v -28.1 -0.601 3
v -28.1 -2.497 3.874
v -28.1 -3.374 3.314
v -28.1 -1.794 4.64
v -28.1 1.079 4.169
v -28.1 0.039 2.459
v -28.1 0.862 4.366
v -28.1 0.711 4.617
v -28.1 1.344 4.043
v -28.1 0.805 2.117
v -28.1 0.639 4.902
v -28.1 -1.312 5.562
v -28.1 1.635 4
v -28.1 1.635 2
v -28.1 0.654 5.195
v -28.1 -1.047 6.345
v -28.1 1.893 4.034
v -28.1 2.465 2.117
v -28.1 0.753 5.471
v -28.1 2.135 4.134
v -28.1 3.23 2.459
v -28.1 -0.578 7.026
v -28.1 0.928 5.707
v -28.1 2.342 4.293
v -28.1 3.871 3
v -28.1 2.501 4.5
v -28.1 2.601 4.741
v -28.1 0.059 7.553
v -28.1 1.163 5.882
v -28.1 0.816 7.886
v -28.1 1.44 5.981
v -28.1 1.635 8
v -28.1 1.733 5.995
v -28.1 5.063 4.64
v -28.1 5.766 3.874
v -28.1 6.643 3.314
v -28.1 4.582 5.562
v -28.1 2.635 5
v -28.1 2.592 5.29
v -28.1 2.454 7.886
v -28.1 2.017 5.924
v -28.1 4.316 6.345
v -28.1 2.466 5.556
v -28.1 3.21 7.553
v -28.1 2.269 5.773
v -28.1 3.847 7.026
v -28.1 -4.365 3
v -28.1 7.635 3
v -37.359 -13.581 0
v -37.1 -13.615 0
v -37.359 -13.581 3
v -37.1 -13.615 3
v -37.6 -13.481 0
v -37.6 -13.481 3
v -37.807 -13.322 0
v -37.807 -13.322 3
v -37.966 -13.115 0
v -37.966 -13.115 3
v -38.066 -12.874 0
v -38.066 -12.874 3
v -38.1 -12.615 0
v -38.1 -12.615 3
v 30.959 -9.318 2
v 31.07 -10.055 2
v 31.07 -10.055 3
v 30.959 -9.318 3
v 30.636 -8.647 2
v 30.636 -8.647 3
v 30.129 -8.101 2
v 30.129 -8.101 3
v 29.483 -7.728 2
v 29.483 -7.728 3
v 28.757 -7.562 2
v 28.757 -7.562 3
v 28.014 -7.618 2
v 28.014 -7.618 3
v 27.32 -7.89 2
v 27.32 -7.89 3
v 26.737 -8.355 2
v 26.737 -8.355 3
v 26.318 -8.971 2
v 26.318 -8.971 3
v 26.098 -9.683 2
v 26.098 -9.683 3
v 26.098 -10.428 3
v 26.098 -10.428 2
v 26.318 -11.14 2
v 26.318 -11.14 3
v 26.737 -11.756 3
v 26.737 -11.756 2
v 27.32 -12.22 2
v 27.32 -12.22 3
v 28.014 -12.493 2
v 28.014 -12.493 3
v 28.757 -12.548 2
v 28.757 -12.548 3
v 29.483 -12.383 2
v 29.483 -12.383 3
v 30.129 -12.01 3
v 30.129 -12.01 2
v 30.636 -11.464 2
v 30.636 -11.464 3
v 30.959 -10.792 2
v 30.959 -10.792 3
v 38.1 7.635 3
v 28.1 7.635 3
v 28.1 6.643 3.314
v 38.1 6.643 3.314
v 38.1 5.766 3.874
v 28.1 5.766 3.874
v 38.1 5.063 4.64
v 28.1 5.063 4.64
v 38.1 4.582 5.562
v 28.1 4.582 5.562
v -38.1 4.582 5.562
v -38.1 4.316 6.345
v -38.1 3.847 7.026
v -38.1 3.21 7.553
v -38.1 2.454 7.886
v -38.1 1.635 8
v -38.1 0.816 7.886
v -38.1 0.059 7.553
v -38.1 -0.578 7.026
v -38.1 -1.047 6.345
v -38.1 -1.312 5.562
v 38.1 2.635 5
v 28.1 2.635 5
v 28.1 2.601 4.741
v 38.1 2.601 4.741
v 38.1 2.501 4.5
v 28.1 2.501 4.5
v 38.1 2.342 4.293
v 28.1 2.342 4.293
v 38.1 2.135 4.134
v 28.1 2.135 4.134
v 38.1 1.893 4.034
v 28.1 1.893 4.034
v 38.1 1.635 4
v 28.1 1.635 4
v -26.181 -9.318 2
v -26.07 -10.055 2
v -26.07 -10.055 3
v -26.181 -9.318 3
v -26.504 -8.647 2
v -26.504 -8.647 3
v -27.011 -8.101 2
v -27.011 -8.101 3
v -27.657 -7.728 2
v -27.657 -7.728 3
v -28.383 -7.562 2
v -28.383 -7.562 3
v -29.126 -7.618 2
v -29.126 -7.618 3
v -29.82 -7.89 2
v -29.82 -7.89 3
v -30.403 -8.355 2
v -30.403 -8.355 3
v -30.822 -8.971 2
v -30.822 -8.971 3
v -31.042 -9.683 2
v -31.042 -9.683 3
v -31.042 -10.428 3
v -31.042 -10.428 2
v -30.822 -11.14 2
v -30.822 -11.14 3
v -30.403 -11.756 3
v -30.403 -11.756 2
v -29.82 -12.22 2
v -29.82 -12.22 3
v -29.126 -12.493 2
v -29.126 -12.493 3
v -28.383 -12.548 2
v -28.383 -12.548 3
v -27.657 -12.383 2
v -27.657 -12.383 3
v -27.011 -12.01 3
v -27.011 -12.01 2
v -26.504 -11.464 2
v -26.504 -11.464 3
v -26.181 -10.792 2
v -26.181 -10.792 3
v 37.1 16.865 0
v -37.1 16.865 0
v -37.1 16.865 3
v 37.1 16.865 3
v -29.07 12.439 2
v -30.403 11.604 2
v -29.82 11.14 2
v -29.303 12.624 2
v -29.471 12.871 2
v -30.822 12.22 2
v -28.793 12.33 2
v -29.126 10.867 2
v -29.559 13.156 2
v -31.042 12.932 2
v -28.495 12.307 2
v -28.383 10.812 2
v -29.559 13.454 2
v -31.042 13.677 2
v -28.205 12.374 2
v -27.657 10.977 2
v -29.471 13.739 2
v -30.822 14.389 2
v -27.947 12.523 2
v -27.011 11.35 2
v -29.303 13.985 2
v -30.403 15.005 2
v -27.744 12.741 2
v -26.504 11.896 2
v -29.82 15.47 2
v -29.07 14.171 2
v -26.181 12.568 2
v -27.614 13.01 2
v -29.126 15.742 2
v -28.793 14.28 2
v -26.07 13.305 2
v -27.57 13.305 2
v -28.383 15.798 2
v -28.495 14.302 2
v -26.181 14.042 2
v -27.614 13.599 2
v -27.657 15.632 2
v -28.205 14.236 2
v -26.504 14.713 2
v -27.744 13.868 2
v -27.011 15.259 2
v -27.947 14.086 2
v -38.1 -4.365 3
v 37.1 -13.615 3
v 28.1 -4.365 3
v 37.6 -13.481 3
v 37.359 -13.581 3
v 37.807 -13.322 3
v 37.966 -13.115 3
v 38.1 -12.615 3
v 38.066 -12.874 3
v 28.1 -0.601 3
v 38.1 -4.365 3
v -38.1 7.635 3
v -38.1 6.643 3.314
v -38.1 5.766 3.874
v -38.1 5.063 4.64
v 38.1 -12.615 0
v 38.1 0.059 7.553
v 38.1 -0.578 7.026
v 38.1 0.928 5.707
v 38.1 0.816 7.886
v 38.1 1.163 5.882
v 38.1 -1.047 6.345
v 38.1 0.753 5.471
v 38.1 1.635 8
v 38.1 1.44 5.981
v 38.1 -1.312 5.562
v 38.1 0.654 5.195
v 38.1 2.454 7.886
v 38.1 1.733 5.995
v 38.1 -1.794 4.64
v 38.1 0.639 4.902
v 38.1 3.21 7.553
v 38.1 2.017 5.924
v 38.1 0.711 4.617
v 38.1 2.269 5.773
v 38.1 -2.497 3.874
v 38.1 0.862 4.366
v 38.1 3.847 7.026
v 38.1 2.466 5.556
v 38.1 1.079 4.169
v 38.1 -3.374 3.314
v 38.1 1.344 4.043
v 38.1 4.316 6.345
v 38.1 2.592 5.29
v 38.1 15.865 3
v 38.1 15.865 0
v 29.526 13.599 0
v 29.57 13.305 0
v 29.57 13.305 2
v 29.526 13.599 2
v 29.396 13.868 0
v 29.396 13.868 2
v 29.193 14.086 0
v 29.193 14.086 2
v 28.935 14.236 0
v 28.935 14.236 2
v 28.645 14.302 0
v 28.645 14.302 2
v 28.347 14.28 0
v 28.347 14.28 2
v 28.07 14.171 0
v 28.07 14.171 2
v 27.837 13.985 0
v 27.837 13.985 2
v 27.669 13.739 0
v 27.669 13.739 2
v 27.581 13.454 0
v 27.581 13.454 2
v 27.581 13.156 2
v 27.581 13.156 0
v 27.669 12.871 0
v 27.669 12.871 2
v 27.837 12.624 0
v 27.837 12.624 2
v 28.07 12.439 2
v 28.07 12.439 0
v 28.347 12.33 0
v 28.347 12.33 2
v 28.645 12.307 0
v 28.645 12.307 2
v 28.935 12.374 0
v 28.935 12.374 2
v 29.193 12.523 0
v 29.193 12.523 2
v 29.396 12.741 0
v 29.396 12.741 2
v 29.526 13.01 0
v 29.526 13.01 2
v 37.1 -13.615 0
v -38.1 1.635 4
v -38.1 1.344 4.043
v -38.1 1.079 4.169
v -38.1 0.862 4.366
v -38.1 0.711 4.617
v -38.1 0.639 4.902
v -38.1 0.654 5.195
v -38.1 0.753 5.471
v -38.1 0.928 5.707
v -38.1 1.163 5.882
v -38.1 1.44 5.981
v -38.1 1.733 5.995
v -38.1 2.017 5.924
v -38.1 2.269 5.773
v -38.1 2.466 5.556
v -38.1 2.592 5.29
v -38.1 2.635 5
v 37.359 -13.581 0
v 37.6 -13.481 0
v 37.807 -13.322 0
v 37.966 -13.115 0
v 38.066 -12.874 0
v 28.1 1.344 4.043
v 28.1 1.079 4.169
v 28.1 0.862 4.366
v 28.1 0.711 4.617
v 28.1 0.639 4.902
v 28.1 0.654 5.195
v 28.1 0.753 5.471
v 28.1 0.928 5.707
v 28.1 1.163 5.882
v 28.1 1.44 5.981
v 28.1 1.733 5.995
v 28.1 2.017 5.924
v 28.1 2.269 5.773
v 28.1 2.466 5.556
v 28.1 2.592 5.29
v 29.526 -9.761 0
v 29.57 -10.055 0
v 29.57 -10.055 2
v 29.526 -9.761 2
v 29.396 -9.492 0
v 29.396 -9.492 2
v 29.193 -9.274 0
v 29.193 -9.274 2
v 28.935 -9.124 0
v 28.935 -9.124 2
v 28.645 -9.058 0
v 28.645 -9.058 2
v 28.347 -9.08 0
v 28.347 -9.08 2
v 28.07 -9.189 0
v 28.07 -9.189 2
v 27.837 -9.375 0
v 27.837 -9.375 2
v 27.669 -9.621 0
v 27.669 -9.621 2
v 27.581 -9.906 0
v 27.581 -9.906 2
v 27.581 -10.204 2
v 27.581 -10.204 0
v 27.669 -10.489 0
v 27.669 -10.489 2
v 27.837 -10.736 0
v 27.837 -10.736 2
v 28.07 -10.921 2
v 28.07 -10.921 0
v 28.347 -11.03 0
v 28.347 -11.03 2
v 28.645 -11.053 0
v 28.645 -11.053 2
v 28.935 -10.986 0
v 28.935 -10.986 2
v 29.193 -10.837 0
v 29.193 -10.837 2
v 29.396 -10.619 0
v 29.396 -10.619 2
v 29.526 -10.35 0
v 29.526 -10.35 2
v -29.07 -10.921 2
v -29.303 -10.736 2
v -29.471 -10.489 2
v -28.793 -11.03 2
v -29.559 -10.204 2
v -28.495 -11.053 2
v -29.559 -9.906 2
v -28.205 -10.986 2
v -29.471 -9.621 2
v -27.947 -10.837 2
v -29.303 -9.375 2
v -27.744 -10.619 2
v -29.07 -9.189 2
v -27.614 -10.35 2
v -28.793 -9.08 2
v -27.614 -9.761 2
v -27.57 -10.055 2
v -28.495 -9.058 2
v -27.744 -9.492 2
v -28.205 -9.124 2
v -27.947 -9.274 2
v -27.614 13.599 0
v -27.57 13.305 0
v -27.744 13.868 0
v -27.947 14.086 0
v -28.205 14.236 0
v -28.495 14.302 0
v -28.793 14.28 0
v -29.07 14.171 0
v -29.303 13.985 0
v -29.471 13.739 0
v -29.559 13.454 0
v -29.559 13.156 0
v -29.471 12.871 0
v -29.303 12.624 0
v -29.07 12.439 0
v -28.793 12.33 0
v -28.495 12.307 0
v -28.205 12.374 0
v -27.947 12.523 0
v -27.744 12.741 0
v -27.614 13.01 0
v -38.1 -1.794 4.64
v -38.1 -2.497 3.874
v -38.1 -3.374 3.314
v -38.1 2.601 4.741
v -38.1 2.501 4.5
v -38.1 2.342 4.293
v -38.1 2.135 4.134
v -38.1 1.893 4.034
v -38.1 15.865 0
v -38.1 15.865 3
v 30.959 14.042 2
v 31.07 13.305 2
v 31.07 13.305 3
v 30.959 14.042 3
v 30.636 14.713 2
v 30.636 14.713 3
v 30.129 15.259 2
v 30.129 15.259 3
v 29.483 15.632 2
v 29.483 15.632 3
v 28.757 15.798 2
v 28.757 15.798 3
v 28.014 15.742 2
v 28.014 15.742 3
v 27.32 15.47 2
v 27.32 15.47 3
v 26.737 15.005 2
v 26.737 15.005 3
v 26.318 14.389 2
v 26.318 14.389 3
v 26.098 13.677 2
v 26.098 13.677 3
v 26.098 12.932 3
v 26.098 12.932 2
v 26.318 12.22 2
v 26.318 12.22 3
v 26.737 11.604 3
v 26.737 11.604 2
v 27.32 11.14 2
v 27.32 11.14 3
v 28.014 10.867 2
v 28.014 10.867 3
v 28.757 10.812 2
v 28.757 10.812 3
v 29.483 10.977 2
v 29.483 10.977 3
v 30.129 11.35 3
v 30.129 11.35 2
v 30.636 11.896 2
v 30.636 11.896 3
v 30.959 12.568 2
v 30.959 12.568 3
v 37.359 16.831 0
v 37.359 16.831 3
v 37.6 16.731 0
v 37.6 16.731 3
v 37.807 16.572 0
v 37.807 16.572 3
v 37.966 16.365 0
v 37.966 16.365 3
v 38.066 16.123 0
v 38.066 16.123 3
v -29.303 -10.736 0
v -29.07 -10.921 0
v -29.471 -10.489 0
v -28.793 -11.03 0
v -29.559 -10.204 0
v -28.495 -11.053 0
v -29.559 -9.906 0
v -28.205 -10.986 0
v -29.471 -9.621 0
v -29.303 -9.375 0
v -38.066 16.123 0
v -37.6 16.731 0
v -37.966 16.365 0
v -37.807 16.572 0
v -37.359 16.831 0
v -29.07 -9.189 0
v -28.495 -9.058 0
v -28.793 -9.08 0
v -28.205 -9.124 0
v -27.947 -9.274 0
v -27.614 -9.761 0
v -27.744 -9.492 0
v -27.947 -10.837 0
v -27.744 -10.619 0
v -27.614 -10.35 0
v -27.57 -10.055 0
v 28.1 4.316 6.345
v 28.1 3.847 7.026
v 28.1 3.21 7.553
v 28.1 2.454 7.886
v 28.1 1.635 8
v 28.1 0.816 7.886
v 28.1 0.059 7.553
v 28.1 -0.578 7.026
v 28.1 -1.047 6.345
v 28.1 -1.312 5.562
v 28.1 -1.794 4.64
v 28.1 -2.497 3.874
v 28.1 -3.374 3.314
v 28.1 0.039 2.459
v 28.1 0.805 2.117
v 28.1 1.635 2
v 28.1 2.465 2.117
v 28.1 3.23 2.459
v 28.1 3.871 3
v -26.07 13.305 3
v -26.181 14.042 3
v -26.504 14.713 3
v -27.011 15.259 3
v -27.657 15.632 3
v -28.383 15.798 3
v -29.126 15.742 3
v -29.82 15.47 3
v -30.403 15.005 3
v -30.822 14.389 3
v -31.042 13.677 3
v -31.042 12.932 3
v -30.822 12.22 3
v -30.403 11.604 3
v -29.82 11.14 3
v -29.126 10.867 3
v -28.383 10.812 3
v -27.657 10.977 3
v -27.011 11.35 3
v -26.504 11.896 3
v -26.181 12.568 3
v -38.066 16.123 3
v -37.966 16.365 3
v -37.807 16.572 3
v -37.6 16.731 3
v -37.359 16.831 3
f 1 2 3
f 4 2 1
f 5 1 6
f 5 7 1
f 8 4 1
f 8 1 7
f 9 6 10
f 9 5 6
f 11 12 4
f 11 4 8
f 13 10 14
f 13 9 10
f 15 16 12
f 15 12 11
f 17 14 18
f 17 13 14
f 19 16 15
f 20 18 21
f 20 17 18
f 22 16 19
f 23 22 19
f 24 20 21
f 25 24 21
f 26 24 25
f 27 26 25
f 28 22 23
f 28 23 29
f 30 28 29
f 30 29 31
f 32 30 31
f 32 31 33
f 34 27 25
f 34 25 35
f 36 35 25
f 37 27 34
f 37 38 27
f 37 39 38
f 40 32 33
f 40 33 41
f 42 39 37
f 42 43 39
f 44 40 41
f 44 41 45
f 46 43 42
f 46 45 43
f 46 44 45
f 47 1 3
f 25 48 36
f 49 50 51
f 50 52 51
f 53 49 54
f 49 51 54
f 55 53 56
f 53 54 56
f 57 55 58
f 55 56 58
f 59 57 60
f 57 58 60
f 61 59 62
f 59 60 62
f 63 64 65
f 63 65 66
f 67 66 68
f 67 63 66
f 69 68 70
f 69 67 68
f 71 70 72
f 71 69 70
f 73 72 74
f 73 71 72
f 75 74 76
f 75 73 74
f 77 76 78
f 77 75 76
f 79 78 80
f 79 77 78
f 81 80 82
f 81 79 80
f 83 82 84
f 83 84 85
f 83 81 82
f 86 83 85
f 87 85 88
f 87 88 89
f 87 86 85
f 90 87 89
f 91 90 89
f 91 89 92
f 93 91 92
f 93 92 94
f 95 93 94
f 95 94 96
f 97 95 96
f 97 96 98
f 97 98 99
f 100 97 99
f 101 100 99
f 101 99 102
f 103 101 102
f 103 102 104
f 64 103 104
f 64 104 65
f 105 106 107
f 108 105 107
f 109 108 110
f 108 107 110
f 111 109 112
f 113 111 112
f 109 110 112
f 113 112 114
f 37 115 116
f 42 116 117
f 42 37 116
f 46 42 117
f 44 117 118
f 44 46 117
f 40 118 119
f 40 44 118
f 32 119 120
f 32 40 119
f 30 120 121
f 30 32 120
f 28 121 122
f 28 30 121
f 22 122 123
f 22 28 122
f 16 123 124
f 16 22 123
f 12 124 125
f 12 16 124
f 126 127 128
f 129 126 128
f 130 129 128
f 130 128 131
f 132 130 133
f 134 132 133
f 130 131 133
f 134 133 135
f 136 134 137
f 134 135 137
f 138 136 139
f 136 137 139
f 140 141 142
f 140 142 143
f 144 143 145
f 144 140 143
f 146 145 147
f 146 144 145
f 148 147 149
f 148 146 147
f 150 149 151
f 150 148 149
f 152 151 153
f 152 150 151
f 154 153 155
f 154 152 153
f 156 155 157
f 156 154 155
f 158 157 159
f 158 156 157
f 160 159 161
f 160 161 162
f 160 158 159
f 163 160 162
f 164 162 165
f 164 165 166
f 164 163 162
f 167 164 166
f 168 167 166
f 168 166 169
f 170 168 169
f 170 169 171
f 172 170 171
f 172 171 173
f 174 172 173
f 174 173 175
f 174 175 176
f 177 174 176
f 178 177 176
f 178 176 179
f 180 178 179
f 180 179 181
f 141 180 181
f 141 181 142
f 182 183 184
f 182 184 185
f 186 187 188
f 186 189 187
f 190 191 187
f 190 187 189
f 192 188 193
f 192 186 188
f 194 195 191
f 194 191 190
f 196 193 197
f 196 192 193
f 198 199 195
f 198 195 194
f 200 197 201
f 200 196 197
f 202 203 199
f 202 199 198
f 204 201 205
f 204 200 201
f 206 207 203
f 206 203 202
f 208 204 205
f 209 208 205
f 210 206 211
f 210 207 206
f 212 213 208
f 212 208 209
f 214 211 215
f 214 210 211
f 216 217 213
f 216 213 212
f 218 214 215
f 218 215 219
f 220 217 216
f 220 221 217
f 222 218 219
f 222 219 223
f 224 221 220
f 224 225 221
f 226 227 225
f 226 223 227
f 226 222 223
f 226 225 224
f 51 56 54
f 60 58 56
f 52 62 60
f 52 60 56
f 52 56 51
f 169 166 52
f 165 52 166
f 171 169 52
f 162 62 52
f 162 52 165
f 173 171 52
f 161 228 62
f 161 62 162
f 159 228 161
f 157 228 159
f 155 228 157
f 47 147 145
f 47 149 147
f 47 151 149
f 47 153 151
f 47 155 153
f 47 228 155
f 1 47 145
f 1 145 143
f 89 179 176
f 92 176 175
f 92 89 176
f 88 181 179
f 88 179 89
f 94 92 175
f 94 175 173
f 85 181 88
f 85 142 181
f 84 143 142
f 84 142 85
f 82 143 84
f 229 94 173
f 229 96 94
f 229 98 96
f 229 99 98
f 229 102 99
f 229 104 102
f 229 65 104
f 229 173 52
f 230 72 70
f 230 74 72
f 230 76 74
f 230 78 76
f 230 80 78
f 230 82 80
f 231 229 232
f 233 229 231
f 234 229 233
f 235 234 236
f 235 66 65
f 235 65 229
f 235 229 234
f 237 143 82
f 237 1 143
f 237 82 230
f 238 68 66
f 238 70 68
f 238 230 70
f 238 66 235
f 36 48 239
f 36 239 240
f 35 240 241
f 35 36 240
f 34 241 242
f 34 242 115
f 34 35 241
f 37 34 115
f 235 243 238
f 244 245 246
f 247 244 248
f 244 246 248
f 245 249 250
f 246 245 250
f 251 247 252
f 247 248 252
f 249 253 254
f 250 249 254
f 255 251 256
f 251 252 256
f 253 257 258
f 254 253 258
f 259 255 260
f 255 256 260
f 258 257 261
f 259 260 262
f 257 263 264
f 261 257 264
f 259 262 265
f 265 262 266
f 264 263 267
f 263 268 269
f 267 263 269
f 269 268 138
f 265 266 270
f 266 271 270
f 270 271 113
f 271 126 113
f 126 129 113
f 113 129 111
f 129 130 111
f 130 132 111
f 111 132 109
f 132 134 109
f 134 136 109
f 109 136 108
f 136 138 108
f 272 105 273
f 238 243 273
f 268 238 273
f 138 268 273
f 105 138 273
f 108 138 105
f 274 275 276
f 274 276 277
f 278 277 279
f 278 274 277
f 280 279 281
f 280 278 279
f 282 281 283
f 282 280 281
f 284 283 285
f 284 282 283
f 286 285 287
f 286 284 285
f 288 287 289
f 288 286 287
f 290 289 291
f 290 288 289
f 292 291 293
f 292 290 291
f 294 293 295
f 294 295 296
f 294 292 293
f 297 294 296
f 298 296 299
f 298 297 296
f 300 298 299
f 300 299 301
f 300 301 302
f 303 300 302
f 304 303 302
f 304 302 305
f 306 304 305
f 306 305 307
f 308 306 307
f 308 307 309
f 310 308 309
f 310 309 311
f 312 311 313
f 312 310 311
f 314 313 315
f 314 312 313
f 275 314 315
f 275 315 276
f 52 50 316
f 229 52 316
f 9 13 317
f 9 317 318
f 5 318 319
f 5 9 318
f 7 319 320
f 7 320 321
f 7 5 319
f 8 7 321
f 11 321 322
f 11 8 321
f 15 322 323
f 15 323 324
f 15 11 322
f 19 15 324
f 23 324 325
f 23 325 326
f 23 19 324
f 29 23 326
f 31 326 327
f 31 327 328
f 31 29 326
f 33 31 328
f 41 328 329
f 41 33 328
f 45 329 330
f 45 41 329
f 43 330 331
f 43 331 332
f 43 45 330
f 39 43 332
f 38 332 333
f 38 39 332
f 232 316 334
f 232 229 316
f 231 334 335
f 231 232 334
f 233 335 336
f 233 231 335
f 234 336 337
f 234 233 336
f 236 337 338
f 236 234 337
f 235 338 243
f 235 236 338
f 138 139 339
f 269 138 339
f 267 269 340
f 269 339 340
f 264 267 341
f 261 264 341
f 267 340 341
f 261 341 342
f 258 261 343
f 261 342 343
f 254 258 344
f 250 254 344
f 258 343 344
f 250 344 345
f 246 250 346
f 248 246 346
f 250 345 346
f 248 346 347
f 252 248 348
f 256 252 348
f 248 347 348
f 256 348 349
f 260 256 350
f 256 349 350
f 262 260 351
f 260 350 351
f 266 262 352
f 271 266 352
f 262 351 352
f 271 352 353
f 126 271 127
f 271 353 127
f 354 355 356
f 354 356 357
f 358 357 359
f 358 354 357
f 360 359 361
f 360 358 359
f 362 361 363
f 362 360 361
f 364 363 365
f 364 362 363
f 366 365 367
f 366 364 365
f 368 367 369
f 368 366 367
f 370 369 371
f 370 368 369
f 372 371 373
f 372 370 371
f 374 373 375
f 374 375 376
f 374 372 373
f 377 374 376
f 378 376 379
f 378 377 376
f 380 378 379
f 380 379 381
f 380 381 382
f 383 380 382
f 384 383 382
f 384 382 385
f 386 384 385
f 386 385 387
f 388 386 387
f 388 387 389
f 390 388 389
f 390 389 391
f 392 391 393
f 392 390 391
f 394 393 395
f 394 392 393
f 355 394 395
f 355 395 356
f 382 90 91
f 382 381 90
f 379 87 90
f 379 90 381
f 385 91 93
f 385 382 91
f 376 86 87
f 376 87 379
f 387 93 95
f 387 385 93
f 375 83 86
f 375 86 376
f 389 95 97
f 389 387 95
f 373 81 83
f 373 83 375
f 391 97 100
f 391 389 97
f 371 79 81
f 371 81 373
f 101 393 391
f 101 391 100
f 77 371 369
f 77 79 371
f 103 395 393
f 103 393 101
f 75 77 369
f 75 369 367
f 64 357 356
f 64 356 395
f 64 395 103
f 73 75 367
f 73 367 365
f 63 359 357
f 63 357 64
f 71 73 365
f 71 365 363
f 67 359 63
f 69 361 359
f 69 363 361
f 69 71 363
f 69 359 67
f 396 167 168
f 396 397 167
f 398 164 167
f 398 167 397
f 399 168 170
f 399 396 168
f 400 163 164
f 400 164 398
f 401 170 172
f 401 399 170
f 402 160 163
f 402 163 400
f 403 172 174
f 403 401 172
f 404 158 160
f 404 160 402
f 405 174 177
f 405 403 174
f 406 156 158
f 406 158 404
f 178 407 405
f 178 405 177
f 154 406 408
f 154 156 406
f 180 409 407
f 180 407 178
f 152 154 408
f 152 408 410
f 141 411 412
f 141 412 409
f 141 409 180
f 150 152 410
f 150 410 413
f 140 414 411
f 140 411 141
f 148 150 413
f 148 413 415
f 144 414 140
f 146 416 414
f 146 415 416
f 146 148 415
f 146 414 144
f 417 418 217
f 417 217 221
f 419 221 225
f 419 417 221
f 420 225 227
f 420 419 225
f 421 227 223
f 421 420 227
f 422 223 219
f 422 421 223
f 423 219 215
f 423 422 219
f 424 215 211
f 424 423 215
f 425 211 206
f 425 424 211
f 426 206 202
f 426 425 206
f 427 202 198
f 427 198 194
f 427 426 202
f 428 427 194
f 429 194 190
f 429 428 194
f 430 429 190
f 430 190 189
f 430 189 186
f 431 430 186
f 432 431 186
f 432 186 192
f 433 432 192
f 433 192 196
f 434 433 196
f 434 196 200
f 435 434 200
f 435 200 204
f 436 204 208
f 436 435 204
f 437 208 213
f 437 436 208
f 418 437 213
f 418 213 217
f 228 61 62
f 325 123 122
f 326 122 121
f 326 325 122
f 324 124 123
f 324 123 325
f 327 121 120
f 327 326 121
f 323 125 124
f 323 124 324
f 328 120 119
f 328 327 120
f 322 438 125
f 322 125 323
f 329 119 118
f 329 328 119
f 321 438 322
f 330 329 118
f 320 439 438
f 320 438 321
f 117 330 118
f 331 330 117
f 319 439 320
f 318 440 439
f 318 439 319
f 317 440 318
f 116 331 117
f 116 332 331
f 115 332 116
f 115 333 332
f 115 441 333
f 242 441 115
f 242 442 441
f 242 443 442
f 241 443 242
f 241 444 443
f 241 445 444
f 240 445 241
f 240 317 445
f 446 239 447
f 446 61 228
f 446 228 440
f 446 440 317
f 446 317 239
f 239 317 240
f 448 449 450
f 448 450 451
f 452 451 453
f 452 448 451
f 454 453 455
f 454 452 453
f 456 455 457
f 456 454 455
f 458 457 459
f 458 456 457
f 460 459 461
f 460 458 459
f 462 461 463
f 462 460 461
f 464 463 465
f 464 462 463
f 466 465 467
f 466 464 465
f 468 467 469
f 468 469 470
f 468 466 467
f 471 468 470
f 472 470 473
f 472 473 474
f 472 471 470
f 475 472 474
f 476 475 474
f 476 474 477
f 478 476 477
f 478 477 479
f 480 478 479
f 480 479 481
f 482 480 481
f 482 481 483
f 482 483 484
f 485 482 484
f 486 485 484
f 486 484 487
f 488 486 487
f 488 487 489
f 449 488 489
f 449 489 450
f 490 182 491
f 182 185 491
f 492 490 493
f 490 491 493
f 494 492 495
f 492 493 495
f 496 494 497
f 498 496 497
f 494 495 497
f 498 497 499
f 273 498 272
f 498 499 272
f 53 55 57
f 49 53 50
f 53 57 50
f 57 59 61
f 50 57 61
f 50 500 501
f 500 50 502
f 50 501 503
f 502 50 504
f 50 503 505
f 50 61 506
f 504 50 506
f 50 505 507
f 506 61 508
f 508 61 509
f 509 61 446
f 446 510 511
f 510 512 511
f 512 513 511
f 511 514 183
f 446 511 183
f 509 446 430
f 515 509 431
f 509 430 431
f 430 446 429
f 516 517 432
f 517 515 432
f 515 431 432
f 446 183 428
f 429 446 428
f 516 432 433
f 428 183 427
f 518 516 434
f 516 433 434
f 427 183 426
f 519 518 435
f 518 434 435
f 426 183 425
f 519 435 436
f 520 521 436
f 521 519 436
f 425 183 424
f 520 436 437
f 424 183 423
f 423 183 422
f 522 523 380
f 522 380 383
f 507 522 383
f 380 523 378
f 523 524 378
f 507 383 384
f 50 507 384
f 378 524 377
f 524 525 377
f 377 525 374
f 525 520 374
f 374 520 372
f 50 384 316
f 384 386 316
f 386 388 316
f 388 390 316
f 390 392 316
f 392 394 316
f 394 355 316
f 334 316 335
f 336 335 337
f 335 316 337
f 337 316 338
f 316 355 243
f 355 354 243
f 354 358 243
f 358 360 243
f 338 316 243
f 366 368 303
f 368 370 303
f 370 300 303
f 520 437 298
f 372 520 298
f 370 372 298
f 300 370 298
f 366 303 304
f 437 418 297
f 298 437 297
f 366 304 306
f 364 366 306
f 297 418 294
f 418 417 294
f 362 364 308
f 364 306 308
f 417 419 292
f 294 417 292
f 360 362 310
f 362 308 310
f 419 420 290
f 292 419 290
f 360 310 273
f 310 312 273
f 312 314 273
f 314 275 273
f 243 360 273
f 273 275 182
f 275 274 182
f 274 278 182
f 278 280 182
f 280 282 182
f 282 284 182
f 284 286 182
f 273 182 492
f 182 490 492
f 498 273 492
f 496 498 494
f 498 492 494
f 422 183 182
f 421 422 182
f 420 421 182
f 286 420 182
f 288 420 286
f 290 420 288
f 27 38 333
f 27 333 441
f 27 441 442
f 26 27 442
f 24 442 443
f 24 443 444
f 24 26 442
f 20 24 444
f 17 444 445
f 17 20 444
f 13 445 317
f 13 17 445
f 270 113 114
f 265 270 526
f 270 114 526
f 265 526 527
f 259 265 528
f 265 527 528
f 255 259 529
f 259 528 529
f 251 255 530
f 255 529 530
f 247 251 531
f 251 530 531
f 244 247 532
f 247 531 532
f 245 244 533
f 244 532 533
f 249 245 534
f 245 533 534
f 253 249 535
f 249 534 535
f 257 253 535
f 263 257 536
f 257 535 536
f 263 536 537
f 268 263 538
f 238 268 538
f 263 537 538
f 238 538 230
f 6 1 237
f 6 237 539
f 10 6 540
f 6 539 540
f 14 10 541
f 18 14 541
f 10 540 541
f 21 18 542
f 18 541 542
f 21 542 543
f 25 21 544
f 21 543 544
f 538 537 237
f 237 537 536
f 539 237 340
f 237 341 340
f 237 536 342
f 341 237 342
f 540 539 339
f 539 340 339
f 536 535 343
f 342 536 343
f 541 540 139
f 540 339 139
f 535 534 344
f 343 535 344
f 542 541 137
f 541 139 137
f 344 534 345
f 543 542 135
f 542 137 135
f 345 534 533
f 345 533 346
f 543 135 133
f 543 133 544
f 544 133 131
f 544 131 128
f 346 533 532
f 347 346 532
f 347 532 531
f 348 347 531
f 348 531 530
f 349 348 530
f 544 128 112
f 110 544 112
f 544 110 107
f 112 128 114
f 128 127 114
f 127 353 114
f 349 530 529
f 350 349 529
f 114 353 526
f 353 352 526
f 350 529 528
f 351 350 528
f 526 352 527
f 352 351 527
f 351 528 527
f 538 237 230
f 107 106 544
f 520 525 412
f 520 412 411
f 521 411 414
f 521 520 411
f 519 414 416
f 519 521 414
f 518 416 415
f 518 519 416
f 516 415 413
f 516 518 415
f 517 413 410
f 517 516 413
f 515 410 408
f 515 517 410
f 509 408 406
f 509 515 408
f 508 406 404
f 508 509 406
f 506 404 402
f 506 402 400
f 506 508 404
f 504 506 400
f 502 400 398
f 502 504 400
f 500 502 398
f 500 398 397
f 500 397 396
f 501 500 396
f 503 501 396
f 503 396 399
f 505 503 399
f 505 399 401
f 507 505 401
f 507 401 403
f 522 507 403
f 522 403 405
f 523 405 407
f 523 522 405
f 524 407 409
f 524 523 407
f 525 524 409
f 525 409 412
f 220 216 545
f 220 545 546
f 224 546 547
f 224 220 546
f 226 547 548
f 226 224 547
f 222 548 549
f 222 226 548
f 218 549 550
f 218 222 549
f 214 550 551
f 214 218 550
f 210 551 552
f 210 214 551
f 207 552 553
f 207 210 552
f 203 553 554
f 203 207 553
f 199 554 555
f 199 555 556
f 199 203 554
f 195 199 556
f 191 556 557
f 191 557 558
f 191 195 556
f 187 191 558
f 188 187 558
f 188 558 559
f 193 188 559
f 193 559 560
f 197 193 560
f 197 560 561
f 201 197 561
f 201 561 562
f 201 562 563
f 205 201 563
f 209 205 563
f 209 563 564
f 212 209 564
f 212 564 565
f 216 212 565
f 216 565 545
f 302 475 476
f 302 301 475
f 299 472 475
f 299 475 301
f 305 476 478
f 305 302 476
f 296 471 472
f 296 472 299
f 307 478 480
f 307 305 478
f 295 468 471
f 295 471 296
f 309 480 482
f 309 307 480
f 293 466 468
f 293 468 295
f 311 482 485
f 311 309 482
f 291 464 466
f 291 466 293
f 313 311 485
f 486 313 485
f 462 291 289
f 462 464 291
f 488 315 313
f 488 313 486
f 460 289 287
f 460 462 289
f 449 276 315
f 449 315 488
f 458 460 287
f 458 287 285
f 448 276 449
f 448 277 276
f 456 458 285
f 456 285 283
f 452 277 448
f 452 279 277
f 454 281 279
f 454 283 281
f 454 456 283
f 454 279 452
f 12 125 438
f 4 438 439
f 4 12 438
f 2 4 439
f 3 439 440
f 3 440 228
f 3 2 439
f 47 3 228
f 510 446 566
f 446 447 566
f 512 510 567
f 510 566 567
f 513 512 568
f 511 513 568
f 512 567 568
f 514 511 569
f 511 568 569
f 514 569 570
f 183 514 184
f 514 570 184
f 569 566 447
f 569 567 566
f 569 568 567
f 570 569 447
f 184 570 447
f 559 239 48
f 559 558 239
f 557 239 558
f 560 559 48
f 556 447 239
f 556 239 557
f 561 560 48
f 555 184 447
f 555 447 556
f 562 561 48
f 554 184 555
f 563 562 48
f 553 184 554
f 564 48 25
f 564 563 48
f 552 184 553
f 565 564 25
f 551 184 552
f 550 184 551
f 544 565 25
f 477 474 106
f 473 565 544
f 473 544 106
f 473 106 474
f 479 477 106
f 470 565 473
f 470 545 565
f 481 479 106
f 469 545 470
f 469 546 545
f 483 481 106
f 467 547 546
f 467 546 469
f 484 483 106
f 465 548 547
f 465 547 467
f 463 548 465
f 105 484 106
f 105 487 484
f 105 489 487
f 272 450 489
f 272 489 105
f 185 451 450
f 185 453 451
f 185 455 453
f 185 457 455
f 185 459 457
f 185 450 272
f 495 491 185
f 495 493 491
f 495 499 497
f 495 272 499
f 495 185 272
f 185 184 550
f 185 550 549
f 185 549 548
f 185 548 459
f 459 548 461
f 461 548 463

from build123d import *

# Parameters (mm, degrees)
F0_W          = 76.2
F0_H          = 30.48
F0_R          = 2.5
F2_DEPTH      = 3
F0_R_2        = 1
F3_DEPTH      = 2
F4_START      = 28.1
F4_DEPTH      = 10
F5_START      = -28.1
F5_DEPTH      = 10
F6_DEPTH      = 28.1
F6_DEPTH_BACK = 28.1
F7_R          = 1


with BuildPart() as f2:
    # F0 (on Top) → F2 (new body)
    with BuildSketch(Plane.XY):
        with Locations((0, 1.624652555)):
            Rectangle(F0_W, F0_H)
        with Locations((-28.57, -10.055347445)):
            Circle(F0_R, mode=Mode.SUBTRACT)
        with Locations((28.57, -10.055347445)):
            Circle(F0_R, mode=Mode.SUBTRACT)
        with Locations((-28.57, 13.304652555)):
            Circle(F0_R, mode=Mode.SUBTRACT)
        with Locations((28.57, 13.304652555)):
            Circle(F0_R, mode=Mode.SUBTRACT)
    extrude(amount=F2_DEPTH)

    # F0 (on Top) → F3 (join)
    with BuildSketch(Plane.XY):
        with Locations((28.57, 13.304652555)):
            Circle(F0_R)
        with Locations((28.57, 13.304652555)):
            Circle(F0_R_2, mode=Mode.SUBTRACT)
        with Locations((28.57, -10.055347445)):
            Circle(F0_R)
        with Locations((28.57, -10.055347445)):
            Circle(F0_R_2, mode=Mode.SUBTRACT)
        with Locations((-28.57, -10.055347445)):
            Circle(F0_R)
        with Locations((-28.57, -10.055347445)):
            Circle(F0_R_2, mode=Mode.SUBTRACT)
        with Locations((-28.57, 13.304652555)):
            Circle(F0_R)
        with Locations((-28.57, 13.304652555)):
            Circle(F0_R_2, mode=Mode.SUBTRACT)
    extrude(amount=F3_DEPTH)

    # F1 (on Right) → F4 (join)
    with BuildSketch(Plane.YZ.offset(F4_START)):
        with BuildLine():
            ThreePointArc((-1.3122499903, 5.5619300567), (-2.4969921778, 3.8736281168), (-4.365347445, 3))
            Line((-4.365347445, 3), (-0.6014154225, 3))
            ThreePointArc((-0.6014154225, 3), (-1.2561375211, 4.1979197446), (-1.3122499903, 5.5619300567))
        make_face()
        with BuildLine():
            Line((3.8707205325, 3), (7.634652555, 3))
            ThreePointArc((7.634652555, 3), (5.7662972877, 3.8736281168), (4.5815551003, 5.5619300567))
            ThreePointArc((4.5815551003, 5.5619300567), (4.6213486925, 5.2822165518), (4.634652555, 5))
            ThreePointArc((4.634652555, 5), (4.4371696319, 3.9295337307), (3.8707205325, 3))
        make_face()
        with BuildLine():
            ThreePointArc((-1.3122499903, 5.5619300567), (-1.2561375211, 4.1979197446), (-0.6014154225, 3))
            Line((-0.6014154225, 3), (3.8707205325, 3))
            ThreePointArc((3.8707205325, 3), (4.4371696319, 3.9295337307), (4.634652555, 5))
            ThreePointArc((4.634652555, 5), (4.6213486925, 5.2822165518), (4.5815551003, 5.5619300567))
            ThreePointArc((4.5815551003, 5.5619300567), (1.634652555, 8), (-1.3122499903, 5.5619300567))
        make_face()
        with BuildLine():
            ThreePointArc((1.634652555, 4), (0.9275457738, 5.7071067812), (2.634652555, 5))
            ThreePointArc((2.634652555, 5), (2.3417593362, 4.2928932188), (1.634652555, 4))
        make_face(mode=Mode.SUBTRACT)
    extrude(amount=F4_DEPTH)

    # F1 (on Right) → F5 (join)
    with BuildSketch(Plane.YZ.offset(F5_START)):
        with BuildLine():
            ThreePointArc((-1.3122499903, 5.5619300567), (-2.4969921778, 3.8736281168), (-4.365347445, 3))
            Line((-4.365347445, 3), (-0.6014154225, 3))
            ThreePointArc((-0.6014154225, 3), (-1.2561375211, 4.1979197446), (-1.3122499903, 5.5619300567))
        make_face()
        with BuildLine():
            Line((3.8707205325, 3), (7.634652555, 3))
            ThreePointArc((7.634652555, 3), (5.7662972877, 3.8736281168), (4.5815551003, 5.5619300567))
            ThreePointArc((4.5815551003, 5.5619300567), (4.6213486925, 5.2822165518), (4.634652555, 5))
            ThreePointArc((4.634652555, 5), (4.4371696319, 3.9295337307), (3.8707205325, 3))
        make_face()
        with BuildLine():
            ThreePointArc((-1.3122499903, 5.5619300567), (-1.2561375211, 4.1979197446), (-0.6014154225, 3))
            Line((-0.6014154225, 3), (3.8707205325, 3))
            ThreePointArc((3.8707205325, 3), (4.4371696319, 3.9295337307), (4.634652555, 5))
            ThreePointArc((4.634652555, 5), (4.6213486925, 5.2822165518), (4.5815551003, 5.5619300567))
            ThreePointArc((4.5815551003, 5.5619300567), (1.634652555, 8), (-1.3122499903, 5.5619300567))
        make_face()
        with BuildLine():
            ThreePointArc((1.634652555, 4), (0.9275457738, 5.7071067812), (2.634652555, 5))
            ThreePointArc((2.634652555, 5), (2.3417593362, 4.2928932188), (1.634652555, 4))
        make_face(mode=Mode.SUBTRACT)
    extrude(amount=-F5_DEPTH)

    # F1 (on Right) → F6 (cut, two sides)
    with BuildSketch(Plane.YZ) as f6_sk:
        with BuildLine():
            Line((3.8707205325, 3), (-0.6014154225, 3))
            ThreePointArc((-0.6014154225, 3), (1.634652555, 2), (3.8707205325, 3))
        make_face()
    extrude(amount=-F6_DEPTH, mode=Mode.SUBTRACT)
    extrude(f6_sk.sketch, amount=F6_DEPTH_BACK, mode=Mode.SUBTRACT)

    # F7
    f7_edges = [f2.edges().sort_by_distance(p)[0] for p in [
        (38.1, -13.615347, 1.5),
        (38.1, 16.864653, 1.5),
        (-38.1, 16.864653, 1.5),
        (-38.1, -13.615347, 1.5),
    ]]
    fillet(f7_edges, radius=F7_R)


solid = f2.part
